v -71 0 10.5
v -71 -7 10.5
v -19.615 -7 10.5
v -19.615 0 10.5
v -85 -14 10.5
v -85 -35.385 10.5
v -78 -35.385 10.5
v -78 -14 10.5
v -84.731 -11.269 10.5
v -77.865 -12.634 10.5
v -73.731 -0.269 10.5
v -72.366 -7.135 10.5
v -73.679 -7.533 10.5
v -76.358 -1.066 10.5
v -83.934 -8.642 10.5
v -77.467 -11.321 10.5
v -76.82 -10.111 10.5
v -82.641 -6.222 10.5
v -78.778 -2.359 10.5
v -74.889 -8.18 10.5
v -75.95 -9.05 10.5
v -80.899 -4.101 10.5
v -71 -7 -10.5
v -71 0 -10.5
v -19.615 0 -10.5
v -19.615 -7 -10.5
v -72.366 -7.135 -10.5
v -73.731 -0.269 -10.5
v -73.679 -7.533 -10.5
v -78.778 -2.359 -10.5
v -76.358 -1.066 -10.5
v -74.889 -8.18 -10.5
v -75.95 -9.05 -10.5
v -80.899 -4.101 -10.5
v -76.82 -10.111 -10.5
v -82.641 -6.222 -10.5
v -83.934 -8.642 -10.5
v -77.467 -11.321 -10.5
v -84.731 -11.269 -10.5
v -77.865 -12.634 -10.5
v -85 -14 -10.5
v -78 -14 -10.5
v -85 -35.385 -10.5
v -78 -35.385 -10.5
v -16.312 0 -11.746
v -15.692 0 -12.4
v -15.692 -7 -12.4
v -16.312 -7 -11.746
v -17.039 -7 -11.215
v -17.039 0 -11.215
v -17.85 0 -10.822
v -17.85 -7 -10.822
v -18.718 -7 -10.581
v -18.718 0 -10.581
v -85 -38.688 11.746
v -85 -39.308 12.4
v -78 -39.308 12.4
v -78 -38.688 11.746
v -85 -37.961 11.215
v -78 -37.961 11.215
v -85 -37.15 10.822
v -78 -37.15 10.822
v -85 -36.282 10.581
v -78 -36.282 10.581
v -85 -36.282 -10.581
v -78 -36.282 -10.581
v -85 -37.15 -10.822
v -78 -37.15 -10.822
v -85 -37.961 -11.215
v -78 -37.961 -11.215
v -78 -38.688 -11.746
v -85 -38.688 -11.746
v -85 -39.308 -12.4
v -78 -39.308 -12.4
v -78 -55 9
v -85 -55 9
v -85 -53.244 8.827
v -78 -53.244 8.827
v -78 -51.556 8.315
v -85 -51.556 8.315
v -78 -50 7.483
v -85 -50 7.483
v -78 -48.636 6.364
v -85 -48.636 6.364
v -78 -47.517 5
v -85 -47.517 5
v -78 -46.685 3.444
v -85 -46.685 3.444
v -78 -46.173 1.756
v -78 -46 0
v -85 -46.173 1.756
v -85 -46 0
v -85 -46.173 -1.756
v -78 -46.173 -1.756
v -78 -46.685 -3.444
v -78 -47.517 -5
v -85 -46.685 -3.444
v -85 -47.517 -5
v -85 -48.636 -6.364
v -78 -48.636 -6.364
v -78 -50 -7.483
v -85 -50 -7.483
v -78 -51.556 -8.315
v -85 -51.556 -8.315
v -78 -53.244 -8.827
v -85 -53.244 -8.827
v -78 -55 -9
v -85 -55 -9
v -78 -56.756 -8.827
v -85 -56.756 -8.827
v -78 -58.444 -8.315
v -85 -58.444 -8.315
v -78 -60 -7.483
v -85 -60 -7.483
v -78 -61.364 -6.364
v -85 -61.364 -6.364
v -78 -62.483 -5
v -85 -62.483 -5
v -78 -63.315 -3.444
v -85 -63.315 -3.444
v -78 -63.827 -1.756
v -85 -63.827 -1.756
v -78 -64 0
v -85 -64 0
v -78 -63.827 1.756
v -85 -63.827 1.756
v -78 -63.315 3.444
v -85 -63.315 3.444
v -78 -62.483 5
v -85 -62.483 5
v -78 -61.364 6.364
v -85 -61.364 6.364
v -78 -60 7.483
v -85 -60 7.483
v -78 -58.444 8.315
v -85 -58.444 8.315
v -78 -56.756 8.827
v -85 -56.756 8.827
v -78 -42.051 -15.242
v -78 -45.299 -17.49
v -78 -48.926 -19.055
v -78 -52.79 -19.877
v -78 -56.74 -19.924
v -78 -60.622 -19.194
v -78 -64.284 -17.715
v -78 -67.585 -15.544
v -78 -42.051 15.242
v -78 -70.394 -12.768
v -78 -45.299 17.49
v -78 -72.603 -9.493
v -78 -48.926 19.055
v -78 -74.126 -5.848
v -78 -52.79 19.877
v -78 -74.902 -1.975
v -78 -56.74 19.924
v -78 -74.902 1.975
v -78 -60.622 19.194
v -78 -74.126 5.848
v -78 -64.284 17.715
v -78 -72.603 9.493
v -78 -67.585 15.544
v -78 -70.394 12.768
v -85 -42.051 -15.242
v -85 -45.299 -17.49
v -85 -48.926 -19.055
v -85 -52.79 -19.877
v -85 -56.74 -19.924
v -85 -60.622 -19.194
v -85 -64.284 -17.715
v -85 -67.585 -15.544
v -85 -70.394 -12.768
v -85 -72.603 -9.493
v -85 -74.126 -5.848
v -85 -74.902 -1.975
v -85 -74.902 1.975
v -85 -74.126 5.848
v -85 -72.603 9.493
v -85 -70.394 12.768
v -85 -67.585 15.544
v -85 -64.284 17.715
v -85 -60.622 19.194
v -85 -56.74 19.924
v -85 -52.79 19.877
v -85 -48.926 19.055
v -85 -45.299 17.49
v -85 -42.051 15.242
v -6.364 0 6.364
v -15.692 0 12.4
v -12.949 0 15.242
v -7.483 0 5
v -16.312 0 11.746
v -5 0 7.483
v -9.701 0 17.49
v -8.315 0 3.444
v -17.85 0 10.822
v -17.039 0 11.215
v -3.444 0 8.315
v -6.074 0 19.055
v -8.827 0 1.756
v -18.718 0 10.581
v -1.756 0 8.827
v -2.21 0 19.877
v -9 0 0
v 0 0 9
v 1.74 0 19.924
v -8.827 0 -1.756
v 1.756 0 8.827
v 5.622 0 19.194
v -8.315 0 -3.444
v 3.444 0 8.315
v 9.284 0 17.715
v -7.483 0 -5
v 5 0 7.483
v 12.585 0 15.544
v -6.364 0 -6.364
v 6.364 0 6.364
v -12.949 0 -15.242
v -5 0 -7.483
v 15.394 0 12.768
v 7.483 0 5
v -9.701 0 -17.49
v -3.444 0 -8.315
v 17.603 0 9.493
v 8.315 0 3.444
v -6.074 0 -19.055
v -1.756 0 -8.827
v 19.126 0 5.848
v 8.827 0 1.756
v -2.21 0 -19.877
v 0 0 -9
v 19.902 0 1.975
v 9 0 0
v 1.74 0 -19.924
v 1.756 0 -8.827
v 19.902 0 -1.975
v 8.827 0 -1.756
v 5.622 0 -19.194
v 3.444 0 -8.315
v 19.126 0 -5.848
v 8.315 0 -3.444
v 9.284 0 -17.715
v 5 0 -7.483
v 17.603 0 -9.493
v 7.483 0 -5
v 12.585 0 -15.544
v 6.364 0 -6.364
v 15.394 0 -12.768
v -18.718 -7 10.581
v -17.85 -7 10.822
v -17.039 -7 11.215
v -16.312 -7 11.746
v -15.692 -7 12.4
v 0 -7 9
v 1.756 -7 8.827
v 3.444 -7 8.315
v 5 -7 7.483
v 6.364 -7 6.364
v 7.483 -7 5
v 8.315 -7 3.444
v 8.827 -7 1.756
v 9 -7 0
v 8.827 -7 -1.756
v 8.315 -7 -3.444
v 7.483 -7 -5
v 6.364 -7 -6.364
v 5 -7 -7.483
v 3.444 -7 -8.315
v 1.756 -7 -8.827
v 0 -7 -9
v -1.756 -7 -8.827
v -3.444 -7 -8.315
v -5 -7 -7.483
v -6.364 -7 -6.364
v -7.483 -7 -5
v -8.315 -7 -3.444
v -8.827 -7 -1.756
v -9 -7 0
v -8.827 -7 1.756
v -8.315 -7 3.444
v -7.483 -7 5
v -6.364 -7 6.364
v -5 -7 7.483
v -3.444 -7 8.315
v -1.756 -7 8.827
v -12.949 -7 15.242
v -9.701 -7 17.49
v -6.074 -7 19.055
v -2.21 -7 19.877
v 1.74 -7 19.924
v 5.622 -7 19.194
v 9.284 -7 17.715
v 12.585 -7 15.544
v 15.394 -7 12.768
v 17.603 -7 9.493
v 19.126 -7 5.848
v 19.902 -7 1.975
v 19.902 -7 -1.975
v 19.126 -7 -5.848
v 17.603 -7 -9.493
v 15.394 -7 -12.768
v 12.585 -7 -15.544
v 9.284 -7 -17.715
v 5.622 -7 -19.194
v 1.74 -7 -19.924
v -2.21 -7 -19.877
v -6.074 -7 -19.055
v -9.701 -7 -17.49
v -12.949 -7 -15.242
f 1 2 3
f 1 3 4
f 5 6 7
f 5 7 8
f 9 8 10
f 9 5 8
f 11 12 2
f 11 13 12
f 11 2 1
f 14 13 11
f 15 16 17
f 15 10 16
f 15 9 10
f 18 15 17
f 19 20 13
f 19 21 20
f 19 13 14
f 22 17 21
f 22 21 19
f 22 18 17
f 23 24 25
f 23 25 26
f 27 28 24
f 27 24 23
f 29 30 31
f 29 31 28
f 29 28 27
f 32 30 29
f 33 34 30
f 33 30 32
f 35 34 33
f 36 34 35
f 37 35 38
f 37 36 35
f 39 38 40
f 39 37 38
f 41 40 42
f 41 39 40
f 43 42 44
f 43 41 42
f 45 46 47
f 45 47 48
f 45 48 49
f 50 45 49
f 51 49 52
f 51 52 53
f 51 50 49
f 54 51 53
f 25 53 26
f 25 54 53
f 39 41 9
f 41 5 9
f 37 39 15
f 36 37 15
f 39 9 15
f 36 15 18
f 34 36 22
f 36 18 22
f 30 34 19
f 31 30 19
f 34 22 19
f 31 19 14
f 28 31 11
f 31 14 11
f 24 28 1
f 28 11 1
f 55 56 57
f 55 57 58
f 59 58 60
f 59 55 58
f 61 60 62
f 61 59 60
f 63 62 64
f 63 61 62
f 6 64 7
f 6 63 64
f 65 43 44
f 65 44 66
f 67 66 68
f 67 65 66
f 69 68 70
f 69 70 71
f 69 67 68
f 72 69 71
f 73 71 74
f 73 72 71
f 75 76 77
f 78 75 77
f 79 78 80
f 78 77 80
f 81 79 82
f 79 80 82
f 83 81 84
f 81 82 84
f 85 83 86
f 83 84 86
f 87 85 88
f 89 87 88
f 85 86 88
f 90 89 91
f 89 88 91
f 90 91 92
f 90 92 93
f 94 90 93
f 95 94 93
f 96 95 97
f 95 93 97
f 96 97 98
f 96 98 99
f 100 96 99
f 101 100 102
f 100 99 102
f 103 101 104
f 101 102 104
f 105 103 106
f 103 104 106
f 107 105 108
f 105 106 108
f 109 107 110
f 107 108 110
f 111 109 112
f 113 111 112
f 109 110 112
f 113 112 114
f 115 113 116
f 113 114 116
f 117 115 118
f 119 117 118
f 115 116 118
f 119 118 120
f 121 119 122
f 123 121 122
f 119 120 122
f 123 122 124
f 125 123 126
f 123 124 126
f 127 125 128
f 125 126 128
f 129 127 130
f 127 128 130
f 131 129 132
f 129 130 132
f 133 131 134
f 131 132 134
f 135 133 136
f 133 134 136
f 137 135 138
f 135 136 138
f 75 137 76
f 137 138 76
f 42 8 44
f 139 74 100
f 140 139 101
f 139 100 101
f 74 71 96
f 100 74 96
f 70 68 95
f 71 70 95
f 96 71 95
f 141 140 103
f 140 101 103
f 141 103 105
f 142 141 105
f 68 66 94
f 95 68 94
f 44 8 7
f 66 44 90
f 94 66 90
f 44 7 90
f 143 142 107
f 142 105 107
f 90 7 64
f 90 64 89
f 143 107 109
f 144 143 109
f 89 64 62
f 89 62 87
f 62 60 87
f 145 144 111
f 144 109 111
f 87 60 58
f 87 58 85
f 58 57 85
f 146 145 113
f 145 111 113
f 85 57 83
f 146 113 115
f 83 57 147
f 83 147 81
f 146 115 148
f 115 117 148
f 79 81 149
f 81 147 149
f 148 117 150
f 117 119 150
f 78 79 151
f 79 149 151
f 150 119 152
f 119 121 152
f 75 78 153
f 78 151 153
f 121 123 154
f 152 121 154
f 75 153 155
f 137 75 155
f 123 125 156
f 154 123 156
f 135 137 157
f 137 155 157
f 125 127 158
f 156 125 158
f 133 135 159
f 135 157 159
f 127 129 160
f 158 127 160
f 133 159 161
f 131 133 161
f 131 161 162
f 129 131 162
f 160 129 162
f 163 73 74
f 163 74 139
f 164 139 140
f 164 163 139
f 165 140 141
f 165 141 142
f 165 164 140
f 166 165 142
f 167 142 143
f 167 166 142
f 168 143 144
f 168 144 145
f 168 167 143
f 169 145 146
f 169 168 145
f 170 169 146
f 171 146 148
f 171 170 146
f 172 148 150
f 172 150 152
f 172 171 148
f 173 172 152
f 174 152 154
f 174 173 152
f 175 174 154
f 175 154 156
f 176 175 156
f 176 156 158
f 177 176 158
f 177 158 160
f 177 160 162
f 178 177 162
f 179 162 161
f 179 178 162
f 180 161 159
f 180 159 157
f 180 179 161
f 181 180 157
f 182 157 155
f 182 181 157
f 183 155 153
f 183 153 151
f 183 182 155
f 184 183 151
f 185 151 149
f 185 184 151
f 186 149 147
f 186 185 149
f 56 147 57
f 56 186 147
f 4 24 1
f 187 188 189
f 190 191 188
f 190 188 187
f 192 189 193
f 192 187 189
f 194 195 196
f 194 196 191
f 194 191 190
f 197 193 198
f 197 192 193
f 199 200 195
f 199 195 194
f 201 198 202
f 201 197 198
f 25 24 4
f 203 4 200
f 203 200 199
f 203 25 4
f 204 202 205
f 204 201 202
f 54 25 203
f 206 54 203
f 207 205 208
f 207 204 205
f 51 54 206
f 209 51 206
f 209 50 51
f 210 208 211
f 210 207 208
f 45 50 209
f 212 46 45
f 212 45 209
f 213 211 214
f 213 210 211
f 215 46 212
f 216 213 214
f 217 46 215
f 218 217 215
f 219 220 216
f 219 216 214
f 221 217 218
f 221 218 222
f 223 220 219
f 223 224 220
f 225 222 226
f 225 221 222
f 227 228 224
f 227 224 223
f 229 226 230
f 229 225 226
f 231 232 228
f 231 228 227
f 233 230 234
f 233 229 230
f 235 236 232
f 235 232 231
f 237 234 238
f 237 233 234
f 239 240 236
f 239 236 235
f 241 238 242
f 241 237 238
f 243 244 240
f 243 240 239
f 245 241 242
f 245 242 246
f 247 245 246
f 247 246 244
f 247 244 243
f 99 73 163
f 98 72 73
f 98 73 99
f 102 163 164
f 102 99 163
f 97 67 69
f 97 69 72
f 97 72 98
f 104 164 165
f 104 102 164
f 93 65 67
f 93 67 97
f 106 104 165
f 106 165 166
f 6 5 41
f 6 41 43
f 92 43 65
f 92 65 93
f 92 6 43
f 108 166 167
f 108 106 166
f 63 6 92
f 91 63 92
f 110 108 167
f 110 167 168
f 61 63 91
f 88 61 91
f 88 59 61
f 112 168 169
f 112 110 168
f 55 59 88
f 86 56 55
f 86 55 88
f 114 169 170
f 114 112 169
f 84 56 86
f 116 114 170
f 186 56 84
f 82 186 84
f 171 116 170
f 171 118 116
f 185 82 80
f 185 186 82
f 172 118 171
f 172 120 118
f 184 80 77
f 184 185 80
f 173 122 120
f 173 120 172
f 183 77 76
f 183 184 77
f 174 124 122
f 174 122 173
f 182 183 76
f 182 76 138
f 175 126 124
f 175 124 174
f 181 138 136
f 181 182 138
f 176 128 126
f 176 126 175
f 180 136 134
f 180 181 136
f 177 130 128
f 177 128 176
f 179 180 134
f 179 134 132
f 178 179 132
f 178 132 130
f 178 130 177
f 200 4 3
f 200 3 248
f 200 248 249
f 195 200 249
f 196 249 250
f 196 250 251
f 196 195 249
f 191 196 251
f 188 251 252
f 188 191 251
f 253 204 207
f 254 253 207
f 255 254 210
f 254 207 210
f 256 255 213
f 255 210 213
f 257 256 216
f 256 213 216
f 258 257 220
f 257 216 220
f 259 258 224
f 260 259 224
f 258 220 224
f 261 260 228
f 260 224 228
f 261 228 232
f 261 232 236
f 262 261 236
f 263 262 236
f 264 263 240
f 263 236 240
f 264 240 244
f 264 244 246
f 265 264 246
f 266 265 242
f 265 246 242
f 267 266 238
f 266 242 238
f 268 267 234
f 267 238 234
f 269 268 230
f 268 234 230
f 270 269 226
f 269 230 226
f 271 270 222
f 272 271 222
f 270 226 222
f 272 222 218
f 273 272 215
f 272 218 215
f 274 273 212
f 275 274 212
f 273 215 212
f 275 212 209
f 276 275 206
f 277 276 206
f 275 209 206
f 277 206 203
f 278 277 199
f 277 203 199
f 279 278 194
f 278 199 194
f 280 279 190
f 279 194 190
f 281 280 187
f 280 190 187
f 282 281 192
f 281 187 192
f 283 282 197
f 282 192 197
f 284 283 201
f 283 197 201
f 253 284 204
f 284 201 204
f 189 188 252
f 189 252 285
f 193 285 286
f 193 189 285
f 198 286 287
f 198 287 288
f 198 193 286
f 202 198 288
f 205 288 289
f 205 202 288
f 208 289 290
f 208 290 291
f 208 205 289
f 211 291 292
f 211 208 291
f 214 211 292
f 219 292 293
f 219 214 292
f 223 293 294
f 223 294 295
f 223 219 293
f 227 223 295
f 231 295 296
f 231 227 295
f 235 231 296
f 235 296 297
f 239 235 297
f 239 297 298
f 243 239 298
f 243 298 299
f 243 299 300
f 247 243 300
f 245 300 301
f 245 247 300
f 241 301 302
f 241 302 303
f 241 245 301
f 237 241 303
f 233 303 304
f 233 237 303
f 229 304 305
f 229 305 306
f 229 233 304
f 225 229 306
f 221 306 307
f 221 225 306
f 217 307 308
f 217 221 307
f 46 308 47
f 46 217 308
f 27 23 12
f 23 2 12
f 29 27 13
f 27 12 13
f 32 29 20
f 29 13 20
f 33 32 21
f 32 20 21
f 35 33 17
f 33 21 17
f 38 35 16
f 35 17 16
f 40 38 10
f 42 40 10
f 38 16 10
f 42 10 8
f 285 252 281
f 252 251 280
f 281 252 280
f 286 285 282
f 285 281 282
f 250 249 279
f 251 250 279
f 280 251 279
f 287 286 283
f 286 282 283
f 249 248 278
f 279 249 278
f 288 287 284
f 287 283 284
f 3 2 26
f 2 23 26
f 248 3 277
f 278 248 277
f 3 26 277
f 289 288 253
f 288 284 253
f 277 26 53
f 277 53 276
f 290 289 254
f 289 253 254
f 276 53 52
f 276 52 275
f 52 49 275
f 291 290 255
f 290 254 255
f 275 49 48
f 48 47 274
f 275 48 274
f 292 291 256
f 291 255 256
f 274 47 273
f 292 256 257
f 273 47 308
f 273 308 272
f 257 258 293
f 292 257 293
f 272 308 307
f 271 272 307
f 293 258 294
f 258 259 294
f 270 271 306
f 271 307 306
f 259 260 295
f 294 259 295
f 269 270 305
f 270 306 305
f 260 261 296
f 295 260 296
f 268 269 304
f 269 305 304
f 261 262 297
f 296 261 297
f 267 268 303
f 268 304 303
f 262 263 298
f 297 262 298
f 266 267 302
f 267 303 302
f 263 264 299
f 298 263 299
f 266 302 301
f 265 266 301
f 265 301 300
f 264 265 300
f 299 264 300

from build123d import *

# Parameters (mm, degrees)
SKETCH1_R           = 9
BOSS_EXTRUDE1_DEPTH = 7
BOSS_EXTRUDE2_START = 85
SKETCH2_R           = 9
BOSS_EXTRUDE2_DEPTH = 7
FILLET1_R           = 14
FILLET2_R           = 7


with BuildPart() as part:
    # Sketch1 → Boss-Extrude1 (new body)
    with BuildSketch(Plane(origin=(0, 0, 0), x_dir=(1, 0, 0), z_dir=(0, 1, 0))):
        with BuildLine():
            Line((-19.615045246, 10.5), (-85, 10.5))
            Line((-85, 10.5), (-85, -10.5))
            Line((-85, -10.5), (-19.615045246, -10.5))
            ThreePointArc((-19.615045246, -10.5), (-17.435595774, -11), (-15.692036197, -12.4))
            ThreePointArc((-15.692036197, -12.4), (20, 0), (-15.692036197, 12.4))
            ThreePointArc((-15.692036197, 12.4), (-17.435595774, 11), (-19.615045246, 10.5))
        make_face()
        with Locations(Location((0, 0, 0), (0, 0, 270))):
            Circle(SKETCH1_R, mode=Mode.SUBTRACT)
    extrude(amount=-BOSS_EXTRUDE1_DEPTH)

    # Sketch2 → Boss-Extrude2 (add)
    with BuildSketch(Plane(origin=(0, -33.238764045, -33.238764045), x_dir=(0, -1, 0), z_dir=(-1, 0, 0)).offset(BOSS_EXTRUDE2_START)):
        with BuildLine():
            Line((2.146190709, 43.738764045), (-33.238764045, 43.738764045))
            Line((-33.238764045, 43.738764045), (-33.238764045, 22.738764045))
            Line((-33.238764045, 22.738764045), (2.146190709, 22.738764045))
            ThreePointArc((2.146190709, 22.738764045), (4.325640181, 22.238764045), (6.069199758, 20.838764045))
            ThreePointArc((6.069199758, 20.838764045), (41.761235955, 33.238764045), (6.069199758, 45.638764045))
            ThreePointArc((6.069199758, 45.638764045), (4.325640181, 44.238764045), (2.146190709, 43.738764045))
        make_face()
        with Locations(Location((21.761235955, 33.238764045, 0), (0, 0, 90))):
            Circle(SKETCH2_R, mode=Mode.SUBTRACT)
    extrude(amount=-BOSS_EXTRUDE2_DEPTH)

    # Fillet1
    fillet1_edges = [part.edges().sort_by_distance(p)[0] for p in [
        (-85, 0, 0),
    ]]
    fillet(fillet1_edges, radius=FILLET1_R)

    # Fillet2
    fillet2_edges = [part.edges().sort_by_distance(p)[0] for p in [
        (-78, -7, 0),
    ]]
    fillet(fillet2_edges, radius=FILLET2_R)


solid = part.part
